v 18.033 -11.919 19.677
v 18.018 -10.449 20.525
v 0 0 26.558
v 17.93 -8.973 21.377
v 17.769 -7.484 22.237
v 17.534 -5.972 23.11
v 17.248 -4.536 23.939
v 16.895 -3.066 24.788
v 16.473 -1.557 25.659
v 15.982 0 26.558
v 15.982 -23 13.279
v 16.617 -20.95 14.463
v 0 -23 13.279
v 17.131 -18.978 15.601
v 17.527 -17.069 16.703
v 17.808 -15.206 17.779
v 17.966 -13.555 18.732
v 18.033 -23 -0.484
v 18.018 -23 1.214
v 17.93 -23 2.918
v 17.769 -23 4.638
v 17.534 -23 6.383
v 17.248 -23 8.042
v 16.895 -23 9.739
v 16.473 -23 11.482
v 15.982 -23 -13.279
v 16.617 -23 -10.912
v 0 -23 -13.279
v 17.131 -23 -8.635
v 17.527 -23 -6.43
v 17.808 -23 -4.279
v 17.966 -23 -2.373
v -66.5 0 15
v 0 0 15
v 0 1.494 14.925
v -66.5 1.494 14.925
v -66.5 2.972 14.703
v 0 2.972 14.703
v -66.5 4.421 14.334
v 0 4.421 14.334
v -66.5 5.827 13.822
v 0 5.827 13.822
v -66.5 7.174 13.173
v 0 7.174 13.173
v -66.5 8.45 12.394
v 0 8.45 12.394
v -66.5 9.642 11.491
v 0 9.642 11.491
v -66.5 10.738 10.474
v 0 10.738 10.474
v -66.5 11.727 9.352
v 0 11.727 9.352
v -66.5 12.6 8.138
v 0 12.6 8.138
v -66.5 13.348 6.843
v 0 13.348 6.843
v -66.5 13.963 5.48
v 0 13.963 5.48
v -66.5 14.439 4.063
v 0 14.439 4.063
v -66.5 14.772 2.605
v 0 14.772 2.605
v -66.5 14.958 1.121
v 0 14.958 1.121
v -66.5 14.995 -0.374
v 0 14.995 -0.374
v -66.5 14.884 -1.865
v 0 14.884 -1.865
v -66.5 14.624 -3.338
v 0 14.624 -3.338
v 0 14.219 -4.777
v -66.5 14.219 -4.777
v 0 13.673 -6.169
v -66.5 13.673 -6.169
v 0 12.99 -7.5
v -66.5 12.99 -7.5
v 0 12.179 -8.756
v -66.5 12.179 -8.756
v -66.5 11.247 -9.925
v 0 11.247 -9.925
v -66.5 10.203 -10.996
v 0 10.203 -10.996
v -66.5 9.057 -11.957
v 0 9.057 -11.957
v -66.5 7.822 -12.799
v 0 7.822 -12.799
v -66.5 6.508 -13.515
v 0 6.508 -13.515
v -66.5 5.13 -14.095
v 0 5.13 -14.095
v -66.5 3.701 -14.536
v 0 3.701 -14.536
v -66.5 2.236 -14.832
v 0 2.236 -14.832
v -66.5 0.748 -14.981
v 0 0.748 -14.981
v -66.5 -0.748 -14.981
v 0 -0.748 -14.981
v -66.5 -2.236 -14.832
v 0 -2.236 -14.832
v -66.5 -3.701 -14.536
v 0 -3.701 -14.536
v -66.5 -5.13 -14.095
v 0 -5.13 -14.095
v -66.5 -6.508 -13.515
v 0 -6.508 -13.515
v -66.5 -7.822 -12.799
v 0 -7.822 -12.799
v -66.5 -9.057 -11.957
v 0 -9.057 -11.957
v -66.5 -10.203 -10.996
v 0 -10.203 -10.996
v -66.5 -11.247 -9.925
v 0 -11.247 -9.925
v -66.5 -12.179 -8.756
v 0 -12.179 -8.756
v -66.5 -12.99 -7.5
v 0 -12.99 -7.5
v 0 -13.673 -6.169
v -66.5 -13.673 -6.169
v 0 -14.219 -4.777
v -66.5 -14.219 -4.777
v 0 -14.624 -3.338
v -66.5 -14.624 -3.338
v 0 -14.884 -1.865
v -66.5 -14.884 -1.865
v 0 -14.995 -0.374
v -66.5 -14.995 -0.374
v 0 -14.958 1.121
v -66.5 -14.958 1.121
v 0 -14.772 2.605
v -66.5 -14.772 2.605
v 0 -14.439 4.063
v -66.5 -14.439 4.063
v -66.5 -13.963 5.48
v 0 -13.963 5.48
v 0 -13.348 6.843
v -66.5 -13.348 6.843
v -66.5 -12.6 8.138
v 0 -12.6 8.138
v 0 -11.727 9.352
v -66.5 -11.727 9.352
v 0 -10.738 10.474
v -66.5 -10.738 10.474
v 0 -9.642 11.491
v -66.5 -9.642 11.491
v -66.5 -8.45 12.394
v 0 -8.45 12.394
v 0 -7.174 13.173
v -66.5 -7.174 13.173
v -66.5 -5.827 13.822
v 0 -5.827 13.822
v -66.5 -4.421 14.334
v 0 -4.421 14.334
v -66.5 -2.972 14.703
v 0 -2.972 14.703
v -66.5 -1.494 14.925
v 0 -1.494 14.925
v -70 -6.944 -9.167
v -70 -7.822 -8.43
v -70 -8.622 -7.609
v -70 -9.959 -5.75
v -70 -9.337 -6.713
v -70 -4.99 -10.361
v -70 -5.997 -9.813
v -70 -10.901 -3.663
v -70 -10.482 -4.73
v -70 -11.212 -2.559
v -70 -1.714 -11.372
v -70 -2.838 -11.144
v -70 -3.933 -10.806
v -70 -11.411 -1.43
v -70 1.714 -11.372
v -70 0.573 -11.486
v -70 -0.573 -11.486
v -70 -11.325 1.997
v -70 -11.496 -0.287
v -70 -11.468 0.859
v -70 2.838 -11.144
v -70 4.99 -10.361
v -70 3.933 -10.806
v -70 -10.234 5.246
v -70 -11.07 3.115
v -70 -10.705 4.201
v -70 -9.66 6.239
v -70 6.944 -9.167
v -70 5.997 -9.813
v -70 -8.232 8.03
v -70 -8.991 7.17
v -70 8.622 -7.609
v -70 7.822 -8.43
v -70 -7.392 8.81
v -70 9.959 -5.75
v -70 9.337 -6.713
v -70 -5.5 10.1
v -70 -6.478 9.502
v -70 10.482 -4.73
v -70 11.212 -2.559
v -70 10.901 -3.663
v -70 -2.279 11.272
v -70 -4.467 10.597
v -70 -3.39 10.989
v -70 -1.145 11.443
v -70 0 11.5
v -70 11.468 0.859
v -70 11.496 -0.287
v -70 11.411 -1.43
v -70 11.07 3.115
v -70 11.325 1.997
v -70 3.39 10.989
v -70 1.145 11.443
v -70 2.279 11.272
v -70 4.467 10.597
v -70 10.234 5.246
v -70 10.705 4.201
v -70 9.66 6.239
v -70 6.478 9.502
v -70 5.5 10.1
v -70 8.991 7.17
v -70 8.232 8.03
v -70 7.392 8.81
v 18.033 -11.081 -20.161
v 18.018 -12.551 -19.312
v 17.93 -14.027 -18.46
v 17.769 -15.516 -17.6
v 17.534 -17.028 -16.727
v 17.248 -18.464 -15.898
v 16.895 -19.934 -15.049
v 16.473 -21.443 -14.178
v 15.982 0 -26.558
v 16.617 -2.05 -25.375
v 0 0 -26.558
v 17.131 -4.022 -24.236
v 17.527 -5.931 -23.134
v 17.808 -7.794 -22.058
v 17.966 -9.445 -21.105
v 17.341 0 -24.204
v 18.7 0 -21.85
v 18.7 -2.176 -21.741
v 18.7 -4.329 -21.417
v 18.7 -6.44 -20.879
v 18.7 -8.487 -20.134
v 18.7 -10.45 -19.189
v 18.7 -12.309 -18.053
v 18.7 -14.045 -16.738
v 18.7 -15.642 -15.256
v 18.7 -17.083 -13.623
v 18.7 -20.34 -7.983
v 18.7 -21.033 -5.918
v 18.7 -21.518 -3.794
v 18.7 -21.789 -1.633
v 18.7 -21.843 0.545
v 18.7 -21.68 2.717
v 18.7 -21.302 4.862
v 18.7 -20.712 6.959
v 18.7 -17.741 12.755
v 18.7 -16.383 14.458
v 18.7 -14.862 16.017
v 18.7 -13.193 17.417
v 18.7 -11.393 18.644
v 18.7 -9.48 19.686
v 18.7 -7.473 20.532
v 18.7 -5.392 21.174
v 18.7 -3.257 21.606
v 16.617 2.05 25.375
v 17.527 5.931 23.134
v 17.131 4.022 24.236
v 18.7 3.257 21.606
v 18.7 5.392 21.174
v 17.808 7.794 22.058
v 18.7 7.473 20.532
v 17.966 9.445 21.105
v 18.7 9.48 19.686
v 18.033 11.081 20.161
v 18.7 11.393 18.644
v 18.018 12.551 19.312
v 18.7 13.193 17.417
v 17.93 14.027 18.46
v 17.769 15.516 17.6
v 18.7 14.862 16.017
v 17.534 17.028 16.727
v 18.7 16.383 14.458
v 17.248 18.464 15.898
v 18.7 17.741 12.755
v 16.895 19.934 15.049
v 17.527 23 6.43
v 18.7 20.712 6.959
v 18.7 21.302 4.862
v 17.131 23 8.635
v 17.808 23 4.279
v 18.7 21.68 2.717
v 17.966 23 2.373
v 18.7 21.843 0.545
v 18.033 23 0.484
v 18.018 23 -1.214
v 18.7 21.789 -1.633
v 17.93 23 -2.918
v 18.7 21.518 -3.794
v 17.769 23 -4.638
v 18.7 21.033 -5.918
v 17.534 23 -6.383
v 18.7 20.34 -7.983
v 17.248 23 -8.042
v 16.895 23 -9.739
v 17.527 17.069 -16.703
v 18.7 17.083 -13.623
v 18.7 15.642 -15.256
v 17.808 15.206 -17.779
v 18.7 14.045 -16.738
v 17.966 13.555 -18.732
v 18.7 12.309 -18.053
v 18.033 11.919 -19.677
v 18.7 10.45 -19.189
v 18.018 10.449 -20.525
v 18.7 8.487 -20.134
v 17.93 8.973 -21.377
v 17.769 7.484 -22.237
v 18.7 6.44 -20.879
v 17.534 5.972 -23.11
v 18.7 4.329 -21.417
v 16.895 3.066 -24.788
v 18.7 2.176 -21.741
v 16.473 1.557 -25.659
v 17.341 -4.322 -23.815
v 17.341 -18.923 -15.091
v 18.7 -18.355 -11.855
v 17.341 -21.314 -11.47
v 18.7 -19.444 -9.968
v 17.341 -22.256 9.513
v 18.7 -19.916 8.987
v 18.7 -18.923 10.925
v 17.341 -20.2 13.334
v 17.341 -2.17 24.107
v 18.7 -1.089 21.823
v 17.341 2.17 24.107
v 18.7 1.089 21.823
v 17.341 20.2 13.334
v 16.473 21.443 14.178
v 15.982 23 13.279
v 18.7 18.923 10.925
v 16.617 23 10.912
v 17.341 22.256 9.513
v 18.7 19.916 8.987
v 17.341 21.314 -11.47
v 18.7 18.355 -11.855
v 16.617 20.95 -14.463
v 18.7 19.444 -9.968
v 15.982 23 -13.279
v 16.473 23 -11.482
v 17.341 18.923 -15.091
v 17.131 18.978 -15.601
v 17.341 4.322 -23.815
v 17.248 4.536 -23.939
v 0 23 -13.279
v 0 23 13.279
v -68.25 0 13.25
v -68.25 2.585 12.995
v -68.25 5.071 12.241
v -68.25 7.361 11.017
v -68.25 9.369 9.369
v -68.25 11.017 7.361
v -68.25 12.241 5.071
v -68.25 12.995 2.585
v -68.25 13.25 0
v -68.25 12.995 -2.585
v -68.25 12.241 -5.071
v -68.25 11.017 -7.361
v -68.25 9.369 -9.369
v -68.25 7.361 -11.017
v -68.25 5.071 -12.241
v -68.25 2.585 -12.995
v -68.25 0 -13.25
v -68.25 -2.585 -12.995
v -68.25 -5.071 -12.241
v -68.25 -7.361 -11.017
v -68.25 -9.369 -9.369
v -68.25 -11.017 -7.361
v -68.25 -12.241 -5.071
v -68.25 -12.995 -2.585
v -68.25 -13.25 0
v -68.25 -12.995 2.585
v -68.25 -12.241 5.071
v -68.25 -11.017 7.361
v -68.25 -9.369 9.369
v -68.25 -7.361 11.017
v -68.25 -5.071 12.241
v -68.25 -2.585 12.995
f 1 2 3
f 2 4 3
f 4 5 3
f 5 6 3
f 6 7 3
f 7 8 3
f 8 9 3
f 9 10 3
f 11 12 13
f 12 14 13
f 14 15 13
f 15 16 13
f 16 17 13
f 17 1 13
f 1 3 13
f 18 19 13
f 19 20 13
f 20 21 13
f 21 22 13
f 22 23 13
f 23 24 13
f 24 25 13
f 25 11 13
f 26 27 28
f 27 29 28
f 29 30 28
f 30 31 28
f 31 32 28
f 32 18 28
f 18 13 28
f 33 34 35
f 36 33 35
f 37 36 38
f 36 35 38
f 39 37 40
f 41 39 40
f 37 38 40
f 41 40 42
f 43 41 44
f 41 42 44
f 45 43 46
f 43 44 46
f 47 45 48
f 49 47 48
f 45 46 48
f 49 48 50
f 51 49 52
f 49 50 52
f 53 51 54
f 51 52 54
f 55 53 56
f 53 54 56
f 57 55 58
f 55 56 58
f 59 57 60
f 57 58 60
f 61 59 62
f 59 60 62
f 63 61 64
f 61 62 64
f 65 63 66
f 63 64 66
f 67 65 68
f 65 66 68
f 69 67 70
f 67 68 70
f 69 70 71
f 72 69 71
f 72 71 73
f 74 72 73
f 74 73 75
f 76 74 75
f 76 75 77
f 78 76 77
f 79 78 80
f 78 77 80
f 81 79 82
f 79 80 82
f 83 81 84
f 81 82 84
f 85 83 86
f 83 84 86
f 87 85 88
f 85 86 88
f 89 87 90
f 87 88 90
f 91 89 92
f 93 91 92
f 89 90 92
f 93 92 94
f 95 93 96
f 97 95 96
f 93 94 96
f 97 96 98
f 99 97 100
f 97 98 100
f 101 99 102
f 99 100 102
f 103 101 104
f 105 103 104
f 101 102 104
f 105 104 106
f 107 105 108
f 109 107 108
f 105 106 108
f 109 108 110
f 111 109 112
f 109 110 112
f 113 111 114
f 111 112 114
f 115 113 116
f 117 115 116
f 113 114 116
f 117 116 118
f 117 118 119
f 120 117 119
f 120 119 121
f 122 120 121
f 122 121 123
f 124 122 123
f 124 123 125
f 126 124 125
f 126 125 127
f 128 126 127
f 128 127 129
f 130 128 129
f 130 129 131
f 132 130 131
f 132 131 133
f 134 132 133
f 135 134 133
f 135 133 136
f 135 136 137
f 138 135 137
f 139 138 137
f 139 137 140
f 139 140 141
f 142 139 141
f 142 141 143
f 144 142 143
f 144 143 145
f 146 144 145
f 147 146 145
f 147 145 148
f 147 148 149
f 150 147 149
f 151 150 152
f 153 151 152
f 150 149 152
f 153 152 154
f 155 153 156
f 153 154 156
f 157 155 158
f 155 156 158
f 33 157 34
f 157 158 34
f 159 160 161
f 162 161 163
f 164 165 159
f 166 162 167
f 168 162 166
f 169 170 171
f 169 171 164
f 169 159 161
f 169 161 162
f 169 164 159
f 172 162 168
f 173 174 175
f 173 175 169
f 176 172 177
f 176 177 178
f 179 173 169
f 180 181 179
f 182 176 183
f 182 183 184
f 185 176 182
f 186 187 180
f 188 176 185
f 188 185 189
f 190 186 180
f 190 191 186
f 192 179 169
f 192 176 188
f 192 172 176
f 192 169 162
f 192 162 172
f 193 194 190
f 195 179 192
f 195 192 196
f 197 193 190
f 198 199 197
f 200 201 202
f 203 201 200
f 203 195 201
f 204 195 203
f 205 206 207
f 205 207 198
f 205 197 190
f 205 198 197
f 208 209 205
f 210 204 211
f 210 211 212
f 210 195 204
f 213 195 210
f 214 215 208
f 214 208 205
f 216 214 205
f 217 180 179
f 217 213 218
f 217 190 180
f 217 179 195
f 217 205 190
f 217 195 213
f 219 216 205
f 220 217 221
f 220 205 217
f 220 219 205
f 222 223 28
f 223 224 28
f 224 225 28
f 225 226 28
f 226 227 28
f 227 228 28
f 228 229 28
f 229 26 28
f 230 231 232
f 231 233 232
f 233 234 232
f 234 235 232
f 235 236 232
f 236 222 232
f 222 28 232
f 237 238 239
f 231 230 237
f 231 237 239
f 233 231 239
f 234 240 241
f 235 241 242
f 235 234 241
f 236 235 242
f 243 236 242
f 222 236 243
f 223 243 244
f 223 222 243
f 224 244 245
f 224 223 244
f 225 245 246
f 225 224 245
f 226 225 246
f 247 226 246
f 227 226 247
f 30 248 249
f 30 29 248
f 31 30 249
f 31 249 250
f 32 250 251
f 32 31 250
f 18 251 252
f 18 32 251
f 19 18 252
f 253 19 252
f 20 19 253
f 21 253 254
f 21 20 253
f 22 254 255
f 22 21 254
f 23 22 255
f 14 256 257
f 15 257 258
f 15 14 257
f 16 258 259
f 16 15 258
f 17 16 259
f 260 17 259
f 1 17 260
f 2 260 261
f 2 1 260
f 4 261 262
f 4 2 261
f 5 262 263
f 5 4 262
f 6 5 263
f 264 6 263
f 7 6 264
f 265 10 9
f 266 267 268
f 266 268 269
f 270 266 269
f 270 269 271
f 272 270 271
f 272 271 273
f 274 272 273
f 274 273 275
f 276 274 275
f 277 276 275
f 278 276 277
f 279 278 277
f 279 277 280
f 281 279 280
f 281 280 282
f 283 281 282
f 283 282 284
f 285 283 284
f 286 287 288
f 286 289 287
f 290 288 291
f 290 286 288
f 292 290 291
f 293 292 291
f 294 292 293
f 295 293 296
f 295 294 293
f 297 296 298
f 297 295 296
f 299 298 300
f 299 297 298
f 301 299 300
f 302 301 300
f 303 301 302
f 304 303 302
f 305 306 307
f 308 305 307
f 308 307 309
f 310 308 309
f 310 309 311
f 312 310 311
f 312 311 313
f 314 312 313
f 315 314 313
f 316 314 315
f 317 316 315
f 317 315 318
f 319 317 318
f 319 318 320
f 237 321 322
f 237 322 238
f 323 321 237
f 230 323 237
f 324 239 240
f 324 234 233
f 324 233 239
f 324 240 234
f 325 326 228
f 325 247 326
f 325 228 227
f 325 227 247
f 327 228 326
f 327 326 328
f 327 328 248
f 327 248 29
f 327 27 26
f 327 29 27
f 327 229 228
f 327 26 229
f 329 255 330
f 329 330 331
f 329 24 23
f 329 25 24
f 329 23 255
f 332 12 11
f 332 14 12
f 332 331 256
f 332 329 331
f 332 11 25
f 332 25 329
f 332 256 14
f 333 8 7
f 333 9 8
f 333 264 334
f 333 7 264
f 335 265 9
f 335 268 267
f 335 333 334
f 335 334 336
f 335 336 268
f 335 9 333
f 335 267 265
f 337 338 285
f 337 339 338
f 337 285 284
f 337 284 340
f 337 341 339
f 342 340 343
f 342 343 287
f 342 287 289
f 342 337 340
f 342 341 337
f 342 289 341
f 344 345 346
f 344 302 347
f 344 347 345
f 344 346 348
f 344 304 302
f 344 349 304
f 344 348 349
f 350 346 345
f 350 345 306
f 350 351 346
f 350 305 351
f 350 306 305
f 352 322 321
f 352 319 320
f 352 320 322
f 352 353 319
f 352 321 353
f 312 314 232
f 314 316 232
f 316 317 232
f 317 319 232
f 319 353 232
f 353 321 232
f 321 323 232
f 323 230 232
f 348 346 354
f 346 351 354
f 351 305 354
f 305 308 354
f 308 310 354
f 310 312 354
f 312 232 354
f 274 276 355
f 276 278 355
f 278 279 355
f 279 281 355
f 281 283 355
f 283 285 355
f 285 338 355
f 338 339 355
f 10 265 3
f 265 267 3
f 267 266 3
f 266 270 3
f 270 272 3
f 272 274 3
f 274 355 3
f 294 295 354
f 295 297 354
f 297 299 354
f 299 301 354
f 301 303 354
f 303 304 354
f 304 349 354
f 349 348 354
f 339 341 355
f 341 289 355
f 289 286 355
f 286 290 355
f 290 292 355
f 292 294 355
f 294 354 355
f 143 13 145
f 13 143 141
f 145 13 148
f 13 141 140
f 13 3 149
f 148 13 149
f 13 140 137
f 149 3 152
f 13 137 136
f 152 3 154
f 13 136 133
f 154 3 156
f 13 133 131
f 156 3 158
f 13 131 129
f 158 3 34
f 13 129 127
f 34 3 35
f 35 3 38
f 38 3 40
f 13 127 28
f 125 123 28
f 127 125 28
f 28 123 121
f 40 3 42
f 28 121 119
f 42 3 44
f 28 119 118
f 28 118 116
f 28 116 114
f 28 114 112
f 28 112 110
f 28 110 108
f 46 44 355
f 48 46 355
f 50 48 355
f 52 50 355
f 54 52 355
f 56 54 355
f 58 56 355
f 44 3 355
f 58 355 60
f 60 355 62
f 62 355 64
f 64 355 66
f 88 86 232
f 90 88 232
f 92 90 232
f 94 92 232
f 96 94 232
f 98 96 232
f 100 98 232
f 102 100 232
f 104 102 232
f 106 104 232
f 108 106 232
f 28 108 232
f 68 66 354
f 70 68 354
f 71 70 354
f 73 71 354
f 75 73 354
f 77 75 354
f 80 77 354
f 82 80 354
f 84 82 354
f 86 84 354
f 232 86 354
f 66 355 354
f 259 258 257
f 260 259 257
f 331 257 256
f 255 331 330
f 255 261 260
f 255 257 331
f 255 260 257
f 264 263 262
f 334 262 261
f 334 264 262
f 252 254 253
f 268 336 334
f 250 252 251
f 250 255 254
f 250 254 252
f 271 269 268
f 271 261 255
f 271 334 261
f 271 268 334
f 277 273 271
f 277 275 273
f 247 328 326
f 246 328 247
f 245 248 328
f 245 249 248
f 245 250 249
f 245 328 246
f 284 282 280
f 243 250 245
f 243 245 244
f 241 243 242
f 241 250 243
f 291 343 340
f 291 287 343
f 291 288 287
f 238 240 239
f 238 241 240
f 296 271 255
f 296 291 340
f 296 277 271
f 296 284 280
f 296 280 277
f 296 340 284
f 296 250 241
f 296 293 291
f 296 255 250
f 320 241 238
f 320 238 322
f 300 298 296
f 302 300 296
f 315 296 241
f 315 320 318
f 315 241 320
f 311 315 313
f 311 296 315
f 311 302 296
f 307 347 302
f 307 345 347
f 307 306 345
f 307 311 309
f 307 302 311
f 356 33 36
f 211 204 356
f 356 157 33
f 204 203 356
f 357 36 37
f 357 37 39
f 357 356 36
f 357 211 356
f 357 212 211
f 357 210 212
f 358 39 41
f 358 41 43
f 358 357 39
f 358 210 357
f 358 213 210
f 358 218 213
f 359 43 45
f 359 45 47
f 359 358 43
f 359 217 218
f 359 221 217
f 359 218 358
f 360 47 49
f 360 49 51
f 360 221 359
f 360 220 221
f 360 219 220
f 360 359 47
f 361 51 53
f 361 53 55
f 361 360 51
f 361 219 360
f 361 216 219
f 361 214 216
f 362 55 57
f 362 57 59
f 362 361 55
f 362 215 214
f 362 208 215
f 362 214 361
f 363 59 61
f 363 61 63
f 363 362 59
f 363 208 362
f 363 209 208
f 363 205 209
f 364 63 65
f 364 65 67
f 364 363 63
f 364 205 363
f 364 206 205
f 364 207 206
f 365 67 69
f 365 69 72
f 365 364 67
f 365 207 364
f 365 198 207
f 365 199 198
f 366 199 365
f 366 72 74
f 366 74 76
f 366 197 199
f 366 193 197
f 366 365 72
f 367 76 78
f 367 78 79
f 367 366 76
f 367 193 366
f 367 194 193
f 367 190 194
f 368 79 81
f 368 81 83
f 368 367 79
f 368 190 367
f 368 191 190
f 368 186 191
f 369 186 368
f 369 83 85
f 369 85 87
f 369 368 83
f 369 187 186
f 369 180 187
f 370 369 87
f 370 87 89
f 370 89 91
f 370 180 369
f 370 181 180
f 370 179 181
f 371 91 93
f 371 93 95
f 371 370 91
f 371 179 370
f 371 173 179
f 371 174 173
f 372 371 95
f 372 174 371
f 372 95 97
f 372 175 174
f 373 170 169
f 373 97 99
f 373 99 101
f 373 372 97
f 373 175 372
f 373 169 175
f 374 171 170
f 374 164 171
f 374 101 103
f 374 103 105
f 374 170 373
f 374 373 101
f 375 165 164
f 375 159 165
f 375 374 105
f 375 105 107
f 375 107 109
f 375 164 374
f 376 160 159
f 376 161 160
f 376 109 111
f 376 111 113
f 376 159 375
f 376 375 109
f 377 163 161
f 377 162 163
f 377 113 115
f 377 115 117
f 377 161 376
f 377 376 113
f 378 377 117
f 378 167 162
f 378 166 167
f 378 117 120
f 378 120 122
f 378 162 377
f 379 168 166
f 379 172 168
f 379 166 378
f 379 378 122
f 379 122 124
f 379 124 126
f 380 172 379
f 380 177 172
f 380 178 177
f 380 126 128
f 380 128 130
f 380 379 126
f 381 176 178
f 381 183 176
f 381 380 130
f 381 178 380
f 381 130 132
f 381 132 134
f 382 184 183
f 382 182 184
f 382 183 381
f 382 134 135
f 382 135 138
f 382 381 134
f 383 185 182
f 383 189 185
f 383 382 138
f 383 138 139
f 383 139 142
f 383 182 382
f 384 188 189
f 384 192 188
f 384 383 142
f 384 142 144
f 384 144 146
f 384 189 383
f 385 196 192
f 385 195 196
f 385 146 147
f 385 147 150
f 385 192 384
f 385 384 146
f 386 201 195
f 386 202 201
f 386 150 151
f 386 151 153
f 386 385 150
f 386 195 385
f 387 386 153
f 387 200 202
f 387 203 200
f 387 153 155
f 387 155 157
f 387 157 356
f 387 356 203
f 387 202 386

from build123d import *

# Parameters (mm, degrees)
EXTRUDE_565_DEPTH = 18.7
SKETCH_2_R        = 15
EXTRUDE_1_DEPTH   = 70
CHAMFER_1_SIZE    = 3.5


with BuildPart() as part:
    # Эскиз1 → Extrude 565 (new body)
    with BuildSketch(Plane(origin=(0, 0, 0), x_dir=(0, 0, -1), z_dir=(1, 0, 0))):
        Polygon((26.558112383, 0), (13.279056191, 23), (-13.279056191, 23), (-26.558112383, 0), (-13.279056191, -23), (13.279056191, -23), align=None)
    extrude(amount=EXTRUDE_565_DEPTH)

    # Эскиз2 → Бобышка-Вытянуть1 (add)
    with BuildSketch(Plane.ZY):
        Circle(SKETCH_2_R)
    extrude(amount=EXTRUDE_1_DEPTH)

    # Фаска1
    chamfer_1_edges = [part.edges().sort_by_distance(p)[0] for p in [
        (-70, 0, -15),
    ]]
    chamfer(chamfer_1_edges, length=CHAMFER_1_SIZE)

    # Эскиз3 (on Front Plane) → Вырез-Вращением1 (revolve, cut)
    with BuildSketch(Plane.XY, mode=Mode.PRIVATE) as cut_revolve_1_sk:
        Polygon((18.7, 26.558112383), (18.7, 21.85), (15.981770048, 26.558112383), align=None)
    revolve(cut_revolve_1_sk.sketch.rotate(Axis((22, 0, 0), (-1, 0, 0)), 90), axis=Axis((22, 0, 0), (-1, 0, 0)), mode=Mode.SUBTRACT)


solid = part.part
